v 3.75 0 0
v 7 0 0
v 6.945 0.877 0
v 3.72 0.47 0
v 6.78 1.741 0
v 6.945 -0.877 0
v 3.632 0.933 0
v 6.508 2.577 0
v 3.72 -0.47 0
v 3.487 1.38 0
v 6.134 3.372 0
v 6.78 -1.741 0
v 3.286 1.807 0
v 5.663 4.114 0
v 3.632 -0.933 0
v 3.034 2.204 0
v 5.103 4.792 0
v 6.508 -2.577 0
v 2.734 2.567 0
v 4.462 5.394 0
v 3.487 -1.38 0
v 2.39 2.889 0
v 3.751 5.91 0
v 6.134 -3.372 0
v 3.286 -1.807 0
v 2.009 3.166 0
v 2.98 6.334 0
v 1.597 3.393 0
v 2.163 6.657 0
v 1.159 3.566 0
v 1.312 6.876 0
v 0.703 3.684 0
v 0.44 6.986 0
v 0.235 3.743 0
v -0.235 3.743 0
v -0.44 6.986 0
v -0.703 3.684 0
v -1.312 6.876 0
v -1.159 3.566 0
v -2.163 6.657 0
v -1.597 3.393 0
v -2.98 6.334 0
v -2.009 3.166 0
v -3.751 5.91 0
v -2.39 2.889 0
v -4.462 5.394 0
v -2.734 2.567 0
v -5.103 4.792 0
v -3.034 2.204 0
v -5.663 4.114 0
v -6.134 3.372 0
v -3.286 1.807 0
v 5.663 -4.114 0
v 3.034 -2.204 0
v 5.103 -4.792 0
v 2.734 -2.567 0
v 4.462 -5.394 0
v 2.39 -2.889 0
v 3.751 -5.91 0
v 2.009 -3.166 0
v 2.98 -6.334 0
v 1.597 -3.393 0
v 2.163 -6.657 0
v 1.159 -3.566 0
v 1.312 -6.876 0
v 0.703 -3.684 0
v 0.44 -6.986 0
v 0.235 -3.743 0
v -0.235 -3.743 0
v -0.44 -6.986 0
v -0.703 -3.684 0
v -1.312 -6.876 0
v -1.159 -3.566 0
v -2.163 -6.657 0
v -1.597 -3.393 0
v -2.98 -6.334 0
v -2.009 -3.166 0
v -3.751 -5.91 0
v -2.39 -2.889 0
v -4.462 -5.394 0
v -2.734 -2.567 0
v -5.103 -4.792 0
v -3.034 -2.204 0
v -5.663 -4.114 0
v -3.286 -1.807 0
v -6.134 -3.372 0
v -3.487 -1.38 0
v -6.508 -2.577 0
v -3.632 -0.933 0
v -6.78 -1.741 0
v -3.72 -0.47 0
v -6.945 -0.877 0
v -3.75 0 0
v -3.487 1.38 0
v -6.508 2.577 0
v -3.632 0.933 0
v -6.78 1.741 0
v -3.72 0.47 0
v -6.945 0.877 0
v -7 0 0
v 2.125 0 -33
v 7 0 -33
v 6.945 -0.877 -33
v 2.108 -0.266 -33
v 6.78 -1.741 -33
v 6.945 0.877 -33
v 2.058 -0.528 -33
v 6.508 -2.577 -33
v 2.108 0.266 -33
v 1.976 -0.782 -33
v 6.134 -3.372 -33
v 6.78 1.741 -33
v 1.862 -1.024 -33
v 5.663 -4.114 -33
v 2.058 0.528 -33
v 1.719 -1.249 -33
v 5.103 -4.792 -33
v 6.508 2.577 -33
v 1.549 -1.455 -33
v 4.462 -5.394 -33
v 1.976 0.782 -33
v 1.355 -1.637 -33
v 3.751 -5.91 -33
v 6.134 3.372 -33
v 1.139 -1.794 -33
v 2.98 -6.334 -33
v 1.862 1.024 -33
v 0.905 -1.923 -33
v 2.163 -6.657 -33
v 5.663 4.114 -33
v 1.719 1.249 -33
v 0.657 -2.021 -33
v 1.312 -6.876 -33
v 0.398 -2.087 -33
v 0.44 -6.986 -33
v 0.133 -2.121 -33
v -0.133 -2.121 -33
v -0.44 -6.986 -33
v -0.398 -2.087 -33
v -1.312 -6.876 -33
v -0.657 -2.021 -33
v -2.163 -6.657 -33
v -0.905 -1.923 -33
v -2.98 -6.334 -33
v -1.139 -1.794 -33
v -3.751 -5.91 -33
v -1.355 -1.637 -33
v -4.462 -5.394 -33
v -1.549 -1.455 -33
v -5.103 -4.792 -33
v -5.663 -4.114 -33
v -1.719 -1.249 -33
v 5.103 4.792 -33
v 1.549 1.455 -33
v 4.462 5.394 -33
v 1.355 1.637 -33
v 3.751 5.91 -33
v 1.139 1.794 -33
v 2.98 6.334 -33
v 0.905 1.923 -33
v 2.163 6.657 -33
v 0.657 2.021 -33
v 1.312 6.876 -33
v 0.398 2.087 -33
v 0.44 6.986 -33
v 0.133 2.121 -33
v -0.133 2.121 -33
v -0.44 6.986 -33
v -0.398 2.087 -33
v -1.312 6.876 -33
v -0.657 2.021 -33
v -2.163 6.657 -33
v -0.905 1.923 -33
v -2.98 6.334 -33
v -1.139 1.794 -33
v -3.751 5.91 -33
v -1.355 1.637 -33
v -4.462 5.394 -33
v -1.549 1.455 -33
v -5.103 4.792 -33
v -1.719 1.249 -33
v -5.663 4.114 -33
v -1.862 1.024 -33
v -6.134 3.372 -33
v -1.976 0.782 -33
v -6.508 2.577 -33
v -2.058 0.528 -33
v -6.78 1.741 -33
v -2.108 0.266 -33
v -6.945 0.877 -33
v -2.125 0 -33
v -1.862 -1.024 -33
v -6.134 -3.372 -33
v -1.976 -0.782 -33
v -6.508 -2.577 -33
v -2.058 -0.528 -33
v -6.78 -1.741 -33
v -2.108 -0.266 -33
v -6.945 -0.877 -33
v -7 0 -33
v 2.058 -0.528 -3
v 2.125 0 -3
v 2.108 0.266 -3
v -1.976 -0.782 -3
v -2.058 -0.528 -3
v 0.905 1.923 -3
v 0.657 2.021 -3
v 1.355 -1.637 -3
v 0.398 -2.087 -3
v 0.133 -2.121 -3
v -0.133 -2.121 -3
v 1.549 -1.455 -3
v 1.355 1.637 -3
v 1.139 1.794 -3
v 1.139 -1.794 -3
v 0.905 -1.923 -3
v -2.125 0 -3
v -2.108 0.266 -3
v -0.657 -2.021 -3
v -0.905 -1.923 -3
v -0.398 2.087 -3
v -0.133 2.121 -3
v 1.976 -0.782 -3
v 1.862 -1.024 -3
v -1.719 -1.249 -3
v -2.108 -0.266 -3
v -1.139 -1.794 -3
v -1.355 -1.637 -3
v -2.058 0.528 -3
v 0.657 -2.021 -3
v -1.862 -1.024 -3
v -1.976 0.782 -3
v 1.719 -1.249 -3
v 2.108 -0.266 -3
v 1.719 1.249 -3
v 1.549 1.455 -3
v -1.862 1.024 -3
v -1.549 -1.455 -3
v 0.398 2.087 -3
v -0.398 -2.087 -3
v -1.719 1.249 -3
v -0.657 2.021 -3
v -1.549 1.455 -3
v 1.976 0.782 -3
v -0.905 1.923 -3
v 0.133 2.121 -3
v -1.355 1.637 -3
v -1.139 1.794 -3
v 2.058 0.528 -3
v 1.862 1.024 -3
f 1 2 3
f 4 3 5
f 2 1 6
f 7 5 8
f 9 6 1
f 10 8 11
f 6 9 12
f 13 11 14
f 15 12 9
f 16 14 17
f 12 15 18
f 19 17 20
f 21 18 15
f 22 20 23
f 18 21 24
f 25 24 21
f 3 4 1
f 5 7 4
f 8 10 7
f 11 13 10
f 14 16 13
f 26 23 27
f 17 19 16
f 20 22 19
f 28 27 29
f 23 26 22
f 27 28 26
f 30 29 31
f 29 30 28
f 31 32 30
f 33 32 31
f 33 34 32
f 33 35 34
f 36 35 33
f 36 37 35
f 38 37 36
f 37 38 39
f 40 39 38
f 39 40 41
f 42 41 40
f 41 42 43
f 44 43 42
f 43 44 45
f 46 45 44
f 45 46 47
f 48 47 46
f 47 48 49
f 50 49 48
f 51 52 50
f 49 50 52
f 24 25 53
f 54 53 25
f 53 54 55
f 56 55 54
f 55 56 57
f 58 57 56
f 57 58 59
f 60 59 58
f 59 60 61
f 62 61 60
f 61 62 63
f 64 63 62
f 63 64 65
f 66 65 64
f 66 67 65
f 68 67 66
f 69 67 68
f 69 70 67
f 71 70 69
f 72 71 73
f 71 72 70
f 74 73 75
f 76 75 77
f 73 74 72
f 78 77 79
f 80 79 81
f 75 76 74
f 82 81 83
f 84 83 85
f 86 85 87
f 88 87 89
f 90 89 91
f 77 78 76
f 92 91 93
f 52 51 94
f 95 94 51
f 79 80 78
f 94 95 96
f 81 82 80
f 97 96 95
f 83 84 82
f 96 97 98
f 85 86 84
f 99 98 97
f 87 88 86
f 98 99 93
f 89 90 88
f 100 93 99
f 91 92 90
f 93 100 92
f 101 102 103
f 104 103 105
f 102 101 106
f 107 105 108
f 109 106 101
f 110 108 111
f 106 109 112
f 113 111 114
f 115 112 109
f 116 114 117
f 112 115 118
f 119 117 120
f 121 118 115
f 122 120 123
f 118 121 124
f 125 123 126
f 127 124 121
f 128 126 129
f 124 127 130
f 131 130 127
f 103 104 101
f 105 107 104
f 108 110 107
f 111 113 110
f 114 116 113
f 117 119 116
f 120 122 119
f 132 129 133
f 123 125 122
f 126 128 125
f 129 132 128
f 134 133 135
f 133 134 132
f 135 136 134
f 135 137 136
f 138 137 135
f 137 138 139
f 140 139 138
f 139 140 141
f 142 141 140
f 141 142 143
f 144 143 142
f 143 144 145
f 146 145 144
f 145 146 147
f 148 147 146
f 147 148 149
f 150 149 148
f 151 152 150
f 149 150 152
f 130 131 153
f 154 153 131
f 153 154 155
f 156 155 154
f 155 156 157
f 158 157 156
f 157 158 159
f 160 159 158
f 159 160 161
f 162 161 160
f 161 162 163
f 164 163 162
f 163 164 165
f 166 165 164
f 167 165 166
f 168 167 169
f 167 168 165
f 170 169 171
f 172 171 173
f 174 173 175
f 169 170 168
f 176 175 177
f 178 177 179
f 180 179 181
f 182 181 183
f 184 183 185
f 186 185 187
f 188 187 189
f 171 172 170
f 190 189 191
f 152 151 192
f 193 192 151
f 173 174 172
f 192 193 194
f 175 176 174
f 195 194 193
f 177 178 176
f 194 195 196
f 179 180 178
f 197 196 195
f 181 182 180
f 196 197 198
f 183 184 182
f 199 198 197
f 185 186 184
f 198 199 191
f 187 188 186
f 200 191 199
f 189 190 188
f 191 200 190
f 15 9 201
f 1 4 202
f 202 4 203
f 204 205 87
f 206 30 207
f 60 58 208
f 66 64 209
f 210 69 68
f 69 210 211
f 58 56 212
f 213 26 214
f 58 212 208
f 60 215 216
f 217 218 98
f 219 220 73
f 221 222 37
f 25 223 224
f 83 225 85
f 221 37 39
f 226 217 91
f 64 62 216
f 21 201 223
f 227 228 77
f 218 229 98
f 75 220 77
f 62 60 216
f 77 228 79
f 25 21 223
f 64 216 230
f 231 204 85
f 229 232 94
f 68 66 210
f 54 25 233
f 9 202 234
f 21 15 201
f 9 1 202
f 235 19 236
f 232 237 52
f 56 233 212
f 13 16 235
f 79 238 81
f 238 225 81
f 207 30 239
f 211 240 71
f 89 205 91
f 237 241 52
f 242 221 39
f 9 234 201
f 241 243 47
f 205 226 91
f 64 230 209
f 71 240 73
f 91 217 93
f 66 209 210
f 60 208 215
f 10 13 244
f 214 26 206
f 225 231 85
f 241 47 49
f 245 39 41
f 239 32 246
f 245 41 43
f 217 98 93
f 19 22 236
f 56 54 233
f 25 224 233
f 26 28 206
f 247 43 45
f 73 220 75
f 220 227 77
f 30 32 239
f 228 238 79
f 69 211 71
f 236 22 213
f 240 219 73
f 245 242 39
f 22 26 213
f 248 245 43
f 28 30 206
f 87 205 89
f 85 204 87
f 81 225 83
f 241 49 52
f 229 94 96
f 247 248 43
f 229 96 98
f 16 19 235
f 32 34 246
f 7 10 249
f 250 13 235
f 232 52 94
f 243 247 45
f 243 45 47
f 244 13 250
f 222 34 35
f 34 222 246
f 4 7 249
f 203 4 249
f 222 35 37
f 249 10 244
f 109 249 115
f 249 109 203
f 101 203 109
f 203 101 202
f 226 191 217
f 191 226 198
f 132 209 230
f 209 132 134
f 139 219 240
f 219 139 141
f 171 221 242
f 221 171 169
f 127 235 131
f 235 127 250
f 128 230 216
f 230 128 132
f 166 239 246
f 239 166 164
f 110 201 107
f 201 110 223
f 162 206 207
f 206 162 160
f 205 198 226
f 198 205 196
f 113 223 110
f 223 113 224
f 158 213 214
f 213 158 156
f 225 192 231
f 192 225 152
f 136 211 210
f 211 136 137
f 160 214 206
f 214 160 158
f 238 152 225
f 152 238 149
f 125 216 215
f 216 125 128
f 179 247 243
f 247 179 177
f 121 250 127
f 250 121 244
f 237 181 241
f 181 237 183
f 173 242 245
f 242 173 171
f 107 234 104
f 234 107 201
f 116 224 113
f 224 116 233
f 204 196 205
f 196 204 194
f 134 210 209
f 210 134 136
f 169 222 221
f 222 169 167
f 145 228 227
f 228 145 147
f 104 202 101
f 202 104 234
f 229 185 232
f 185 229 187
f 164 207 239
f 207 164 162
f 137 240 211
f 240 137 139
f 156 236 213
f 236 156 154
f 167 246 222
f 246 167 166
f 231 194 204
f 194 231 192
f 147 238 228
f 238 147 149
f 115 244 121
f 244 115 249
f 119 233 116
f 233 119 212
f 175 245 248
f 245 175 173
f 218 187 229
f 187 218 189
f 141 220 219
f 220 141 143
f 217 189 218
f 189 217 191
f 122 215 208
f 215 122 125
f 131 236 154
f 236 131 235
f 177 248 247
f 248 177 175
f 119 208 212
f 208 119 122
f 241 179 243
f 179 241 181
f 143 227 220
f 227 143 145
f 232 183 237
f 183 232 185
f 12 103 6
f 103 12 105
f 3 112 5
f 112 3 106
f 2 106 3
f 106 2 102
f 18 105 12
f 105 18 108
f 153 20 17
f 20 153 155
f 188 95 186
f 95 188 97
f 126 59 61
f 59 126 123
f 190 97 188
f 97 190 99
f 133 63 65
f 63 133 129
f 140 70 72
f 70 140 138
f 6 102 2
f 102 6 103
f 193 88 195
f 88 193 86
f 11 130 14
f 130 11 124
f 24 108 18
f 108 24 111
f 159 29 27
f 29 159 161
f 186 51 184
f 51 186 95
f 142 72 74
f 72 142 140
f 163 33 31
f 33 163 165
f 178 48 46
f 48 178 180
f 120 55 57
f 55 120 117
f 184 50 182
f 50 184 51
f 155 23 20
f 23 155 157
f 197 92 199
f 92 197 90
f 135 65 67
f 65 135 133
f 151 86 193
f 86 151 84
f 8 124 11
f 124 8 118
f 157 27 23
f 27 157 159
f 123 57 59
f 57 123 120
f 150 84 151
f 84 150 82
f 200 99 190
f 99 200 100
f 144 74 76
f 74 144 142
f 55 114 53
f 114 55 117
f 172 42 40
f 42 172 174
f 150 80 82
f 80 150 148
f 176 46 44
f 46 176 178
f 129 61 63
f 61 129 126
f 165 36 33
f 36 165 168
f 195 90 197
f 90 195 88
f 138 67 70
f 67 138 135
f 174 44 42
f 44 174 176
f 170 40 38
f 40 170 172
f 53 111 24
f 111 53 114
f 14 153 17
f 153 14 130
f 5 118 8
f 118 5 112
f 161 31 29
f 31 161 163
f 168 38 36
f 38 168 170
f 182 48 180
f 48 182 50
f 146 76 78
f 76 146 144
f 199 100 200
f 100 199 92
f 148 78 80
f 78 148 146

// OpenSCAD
$fn = 50;


difference() {
	union() {
		translate(v = [0, 0, -33.0000000000]) {
			cylinder(h = 33, r = 7.0000000000);
		}
		cylinder(h = 0, r = 13.0000000000);
	}
	union() {
		translate(v = [0, 0, 0]) {
			rotate(a = [0, 0, 0]) {
				difference() {
					union() {
						#translate(v = [0, 0, -33.0000000000]) {
							cylinder(h = 33, r = 2.0000000000);
						}
						#translate(v = [0, 0, -3]) {
							cylinder(h = 3, r1 = 2.1250000000, r2 = 3.7500000000);
						}
						#translate(v = [0, 0, -33.0000000000]) {
							cylinder(h = 33, r = 2.1250000000);
						}
						#translate(v = [0, 0, -33.0000000000]) {
							cylinder(h = 33, r = 2.0000000000);
						}
					}
					union();
				}
			}
		}
	}
}
